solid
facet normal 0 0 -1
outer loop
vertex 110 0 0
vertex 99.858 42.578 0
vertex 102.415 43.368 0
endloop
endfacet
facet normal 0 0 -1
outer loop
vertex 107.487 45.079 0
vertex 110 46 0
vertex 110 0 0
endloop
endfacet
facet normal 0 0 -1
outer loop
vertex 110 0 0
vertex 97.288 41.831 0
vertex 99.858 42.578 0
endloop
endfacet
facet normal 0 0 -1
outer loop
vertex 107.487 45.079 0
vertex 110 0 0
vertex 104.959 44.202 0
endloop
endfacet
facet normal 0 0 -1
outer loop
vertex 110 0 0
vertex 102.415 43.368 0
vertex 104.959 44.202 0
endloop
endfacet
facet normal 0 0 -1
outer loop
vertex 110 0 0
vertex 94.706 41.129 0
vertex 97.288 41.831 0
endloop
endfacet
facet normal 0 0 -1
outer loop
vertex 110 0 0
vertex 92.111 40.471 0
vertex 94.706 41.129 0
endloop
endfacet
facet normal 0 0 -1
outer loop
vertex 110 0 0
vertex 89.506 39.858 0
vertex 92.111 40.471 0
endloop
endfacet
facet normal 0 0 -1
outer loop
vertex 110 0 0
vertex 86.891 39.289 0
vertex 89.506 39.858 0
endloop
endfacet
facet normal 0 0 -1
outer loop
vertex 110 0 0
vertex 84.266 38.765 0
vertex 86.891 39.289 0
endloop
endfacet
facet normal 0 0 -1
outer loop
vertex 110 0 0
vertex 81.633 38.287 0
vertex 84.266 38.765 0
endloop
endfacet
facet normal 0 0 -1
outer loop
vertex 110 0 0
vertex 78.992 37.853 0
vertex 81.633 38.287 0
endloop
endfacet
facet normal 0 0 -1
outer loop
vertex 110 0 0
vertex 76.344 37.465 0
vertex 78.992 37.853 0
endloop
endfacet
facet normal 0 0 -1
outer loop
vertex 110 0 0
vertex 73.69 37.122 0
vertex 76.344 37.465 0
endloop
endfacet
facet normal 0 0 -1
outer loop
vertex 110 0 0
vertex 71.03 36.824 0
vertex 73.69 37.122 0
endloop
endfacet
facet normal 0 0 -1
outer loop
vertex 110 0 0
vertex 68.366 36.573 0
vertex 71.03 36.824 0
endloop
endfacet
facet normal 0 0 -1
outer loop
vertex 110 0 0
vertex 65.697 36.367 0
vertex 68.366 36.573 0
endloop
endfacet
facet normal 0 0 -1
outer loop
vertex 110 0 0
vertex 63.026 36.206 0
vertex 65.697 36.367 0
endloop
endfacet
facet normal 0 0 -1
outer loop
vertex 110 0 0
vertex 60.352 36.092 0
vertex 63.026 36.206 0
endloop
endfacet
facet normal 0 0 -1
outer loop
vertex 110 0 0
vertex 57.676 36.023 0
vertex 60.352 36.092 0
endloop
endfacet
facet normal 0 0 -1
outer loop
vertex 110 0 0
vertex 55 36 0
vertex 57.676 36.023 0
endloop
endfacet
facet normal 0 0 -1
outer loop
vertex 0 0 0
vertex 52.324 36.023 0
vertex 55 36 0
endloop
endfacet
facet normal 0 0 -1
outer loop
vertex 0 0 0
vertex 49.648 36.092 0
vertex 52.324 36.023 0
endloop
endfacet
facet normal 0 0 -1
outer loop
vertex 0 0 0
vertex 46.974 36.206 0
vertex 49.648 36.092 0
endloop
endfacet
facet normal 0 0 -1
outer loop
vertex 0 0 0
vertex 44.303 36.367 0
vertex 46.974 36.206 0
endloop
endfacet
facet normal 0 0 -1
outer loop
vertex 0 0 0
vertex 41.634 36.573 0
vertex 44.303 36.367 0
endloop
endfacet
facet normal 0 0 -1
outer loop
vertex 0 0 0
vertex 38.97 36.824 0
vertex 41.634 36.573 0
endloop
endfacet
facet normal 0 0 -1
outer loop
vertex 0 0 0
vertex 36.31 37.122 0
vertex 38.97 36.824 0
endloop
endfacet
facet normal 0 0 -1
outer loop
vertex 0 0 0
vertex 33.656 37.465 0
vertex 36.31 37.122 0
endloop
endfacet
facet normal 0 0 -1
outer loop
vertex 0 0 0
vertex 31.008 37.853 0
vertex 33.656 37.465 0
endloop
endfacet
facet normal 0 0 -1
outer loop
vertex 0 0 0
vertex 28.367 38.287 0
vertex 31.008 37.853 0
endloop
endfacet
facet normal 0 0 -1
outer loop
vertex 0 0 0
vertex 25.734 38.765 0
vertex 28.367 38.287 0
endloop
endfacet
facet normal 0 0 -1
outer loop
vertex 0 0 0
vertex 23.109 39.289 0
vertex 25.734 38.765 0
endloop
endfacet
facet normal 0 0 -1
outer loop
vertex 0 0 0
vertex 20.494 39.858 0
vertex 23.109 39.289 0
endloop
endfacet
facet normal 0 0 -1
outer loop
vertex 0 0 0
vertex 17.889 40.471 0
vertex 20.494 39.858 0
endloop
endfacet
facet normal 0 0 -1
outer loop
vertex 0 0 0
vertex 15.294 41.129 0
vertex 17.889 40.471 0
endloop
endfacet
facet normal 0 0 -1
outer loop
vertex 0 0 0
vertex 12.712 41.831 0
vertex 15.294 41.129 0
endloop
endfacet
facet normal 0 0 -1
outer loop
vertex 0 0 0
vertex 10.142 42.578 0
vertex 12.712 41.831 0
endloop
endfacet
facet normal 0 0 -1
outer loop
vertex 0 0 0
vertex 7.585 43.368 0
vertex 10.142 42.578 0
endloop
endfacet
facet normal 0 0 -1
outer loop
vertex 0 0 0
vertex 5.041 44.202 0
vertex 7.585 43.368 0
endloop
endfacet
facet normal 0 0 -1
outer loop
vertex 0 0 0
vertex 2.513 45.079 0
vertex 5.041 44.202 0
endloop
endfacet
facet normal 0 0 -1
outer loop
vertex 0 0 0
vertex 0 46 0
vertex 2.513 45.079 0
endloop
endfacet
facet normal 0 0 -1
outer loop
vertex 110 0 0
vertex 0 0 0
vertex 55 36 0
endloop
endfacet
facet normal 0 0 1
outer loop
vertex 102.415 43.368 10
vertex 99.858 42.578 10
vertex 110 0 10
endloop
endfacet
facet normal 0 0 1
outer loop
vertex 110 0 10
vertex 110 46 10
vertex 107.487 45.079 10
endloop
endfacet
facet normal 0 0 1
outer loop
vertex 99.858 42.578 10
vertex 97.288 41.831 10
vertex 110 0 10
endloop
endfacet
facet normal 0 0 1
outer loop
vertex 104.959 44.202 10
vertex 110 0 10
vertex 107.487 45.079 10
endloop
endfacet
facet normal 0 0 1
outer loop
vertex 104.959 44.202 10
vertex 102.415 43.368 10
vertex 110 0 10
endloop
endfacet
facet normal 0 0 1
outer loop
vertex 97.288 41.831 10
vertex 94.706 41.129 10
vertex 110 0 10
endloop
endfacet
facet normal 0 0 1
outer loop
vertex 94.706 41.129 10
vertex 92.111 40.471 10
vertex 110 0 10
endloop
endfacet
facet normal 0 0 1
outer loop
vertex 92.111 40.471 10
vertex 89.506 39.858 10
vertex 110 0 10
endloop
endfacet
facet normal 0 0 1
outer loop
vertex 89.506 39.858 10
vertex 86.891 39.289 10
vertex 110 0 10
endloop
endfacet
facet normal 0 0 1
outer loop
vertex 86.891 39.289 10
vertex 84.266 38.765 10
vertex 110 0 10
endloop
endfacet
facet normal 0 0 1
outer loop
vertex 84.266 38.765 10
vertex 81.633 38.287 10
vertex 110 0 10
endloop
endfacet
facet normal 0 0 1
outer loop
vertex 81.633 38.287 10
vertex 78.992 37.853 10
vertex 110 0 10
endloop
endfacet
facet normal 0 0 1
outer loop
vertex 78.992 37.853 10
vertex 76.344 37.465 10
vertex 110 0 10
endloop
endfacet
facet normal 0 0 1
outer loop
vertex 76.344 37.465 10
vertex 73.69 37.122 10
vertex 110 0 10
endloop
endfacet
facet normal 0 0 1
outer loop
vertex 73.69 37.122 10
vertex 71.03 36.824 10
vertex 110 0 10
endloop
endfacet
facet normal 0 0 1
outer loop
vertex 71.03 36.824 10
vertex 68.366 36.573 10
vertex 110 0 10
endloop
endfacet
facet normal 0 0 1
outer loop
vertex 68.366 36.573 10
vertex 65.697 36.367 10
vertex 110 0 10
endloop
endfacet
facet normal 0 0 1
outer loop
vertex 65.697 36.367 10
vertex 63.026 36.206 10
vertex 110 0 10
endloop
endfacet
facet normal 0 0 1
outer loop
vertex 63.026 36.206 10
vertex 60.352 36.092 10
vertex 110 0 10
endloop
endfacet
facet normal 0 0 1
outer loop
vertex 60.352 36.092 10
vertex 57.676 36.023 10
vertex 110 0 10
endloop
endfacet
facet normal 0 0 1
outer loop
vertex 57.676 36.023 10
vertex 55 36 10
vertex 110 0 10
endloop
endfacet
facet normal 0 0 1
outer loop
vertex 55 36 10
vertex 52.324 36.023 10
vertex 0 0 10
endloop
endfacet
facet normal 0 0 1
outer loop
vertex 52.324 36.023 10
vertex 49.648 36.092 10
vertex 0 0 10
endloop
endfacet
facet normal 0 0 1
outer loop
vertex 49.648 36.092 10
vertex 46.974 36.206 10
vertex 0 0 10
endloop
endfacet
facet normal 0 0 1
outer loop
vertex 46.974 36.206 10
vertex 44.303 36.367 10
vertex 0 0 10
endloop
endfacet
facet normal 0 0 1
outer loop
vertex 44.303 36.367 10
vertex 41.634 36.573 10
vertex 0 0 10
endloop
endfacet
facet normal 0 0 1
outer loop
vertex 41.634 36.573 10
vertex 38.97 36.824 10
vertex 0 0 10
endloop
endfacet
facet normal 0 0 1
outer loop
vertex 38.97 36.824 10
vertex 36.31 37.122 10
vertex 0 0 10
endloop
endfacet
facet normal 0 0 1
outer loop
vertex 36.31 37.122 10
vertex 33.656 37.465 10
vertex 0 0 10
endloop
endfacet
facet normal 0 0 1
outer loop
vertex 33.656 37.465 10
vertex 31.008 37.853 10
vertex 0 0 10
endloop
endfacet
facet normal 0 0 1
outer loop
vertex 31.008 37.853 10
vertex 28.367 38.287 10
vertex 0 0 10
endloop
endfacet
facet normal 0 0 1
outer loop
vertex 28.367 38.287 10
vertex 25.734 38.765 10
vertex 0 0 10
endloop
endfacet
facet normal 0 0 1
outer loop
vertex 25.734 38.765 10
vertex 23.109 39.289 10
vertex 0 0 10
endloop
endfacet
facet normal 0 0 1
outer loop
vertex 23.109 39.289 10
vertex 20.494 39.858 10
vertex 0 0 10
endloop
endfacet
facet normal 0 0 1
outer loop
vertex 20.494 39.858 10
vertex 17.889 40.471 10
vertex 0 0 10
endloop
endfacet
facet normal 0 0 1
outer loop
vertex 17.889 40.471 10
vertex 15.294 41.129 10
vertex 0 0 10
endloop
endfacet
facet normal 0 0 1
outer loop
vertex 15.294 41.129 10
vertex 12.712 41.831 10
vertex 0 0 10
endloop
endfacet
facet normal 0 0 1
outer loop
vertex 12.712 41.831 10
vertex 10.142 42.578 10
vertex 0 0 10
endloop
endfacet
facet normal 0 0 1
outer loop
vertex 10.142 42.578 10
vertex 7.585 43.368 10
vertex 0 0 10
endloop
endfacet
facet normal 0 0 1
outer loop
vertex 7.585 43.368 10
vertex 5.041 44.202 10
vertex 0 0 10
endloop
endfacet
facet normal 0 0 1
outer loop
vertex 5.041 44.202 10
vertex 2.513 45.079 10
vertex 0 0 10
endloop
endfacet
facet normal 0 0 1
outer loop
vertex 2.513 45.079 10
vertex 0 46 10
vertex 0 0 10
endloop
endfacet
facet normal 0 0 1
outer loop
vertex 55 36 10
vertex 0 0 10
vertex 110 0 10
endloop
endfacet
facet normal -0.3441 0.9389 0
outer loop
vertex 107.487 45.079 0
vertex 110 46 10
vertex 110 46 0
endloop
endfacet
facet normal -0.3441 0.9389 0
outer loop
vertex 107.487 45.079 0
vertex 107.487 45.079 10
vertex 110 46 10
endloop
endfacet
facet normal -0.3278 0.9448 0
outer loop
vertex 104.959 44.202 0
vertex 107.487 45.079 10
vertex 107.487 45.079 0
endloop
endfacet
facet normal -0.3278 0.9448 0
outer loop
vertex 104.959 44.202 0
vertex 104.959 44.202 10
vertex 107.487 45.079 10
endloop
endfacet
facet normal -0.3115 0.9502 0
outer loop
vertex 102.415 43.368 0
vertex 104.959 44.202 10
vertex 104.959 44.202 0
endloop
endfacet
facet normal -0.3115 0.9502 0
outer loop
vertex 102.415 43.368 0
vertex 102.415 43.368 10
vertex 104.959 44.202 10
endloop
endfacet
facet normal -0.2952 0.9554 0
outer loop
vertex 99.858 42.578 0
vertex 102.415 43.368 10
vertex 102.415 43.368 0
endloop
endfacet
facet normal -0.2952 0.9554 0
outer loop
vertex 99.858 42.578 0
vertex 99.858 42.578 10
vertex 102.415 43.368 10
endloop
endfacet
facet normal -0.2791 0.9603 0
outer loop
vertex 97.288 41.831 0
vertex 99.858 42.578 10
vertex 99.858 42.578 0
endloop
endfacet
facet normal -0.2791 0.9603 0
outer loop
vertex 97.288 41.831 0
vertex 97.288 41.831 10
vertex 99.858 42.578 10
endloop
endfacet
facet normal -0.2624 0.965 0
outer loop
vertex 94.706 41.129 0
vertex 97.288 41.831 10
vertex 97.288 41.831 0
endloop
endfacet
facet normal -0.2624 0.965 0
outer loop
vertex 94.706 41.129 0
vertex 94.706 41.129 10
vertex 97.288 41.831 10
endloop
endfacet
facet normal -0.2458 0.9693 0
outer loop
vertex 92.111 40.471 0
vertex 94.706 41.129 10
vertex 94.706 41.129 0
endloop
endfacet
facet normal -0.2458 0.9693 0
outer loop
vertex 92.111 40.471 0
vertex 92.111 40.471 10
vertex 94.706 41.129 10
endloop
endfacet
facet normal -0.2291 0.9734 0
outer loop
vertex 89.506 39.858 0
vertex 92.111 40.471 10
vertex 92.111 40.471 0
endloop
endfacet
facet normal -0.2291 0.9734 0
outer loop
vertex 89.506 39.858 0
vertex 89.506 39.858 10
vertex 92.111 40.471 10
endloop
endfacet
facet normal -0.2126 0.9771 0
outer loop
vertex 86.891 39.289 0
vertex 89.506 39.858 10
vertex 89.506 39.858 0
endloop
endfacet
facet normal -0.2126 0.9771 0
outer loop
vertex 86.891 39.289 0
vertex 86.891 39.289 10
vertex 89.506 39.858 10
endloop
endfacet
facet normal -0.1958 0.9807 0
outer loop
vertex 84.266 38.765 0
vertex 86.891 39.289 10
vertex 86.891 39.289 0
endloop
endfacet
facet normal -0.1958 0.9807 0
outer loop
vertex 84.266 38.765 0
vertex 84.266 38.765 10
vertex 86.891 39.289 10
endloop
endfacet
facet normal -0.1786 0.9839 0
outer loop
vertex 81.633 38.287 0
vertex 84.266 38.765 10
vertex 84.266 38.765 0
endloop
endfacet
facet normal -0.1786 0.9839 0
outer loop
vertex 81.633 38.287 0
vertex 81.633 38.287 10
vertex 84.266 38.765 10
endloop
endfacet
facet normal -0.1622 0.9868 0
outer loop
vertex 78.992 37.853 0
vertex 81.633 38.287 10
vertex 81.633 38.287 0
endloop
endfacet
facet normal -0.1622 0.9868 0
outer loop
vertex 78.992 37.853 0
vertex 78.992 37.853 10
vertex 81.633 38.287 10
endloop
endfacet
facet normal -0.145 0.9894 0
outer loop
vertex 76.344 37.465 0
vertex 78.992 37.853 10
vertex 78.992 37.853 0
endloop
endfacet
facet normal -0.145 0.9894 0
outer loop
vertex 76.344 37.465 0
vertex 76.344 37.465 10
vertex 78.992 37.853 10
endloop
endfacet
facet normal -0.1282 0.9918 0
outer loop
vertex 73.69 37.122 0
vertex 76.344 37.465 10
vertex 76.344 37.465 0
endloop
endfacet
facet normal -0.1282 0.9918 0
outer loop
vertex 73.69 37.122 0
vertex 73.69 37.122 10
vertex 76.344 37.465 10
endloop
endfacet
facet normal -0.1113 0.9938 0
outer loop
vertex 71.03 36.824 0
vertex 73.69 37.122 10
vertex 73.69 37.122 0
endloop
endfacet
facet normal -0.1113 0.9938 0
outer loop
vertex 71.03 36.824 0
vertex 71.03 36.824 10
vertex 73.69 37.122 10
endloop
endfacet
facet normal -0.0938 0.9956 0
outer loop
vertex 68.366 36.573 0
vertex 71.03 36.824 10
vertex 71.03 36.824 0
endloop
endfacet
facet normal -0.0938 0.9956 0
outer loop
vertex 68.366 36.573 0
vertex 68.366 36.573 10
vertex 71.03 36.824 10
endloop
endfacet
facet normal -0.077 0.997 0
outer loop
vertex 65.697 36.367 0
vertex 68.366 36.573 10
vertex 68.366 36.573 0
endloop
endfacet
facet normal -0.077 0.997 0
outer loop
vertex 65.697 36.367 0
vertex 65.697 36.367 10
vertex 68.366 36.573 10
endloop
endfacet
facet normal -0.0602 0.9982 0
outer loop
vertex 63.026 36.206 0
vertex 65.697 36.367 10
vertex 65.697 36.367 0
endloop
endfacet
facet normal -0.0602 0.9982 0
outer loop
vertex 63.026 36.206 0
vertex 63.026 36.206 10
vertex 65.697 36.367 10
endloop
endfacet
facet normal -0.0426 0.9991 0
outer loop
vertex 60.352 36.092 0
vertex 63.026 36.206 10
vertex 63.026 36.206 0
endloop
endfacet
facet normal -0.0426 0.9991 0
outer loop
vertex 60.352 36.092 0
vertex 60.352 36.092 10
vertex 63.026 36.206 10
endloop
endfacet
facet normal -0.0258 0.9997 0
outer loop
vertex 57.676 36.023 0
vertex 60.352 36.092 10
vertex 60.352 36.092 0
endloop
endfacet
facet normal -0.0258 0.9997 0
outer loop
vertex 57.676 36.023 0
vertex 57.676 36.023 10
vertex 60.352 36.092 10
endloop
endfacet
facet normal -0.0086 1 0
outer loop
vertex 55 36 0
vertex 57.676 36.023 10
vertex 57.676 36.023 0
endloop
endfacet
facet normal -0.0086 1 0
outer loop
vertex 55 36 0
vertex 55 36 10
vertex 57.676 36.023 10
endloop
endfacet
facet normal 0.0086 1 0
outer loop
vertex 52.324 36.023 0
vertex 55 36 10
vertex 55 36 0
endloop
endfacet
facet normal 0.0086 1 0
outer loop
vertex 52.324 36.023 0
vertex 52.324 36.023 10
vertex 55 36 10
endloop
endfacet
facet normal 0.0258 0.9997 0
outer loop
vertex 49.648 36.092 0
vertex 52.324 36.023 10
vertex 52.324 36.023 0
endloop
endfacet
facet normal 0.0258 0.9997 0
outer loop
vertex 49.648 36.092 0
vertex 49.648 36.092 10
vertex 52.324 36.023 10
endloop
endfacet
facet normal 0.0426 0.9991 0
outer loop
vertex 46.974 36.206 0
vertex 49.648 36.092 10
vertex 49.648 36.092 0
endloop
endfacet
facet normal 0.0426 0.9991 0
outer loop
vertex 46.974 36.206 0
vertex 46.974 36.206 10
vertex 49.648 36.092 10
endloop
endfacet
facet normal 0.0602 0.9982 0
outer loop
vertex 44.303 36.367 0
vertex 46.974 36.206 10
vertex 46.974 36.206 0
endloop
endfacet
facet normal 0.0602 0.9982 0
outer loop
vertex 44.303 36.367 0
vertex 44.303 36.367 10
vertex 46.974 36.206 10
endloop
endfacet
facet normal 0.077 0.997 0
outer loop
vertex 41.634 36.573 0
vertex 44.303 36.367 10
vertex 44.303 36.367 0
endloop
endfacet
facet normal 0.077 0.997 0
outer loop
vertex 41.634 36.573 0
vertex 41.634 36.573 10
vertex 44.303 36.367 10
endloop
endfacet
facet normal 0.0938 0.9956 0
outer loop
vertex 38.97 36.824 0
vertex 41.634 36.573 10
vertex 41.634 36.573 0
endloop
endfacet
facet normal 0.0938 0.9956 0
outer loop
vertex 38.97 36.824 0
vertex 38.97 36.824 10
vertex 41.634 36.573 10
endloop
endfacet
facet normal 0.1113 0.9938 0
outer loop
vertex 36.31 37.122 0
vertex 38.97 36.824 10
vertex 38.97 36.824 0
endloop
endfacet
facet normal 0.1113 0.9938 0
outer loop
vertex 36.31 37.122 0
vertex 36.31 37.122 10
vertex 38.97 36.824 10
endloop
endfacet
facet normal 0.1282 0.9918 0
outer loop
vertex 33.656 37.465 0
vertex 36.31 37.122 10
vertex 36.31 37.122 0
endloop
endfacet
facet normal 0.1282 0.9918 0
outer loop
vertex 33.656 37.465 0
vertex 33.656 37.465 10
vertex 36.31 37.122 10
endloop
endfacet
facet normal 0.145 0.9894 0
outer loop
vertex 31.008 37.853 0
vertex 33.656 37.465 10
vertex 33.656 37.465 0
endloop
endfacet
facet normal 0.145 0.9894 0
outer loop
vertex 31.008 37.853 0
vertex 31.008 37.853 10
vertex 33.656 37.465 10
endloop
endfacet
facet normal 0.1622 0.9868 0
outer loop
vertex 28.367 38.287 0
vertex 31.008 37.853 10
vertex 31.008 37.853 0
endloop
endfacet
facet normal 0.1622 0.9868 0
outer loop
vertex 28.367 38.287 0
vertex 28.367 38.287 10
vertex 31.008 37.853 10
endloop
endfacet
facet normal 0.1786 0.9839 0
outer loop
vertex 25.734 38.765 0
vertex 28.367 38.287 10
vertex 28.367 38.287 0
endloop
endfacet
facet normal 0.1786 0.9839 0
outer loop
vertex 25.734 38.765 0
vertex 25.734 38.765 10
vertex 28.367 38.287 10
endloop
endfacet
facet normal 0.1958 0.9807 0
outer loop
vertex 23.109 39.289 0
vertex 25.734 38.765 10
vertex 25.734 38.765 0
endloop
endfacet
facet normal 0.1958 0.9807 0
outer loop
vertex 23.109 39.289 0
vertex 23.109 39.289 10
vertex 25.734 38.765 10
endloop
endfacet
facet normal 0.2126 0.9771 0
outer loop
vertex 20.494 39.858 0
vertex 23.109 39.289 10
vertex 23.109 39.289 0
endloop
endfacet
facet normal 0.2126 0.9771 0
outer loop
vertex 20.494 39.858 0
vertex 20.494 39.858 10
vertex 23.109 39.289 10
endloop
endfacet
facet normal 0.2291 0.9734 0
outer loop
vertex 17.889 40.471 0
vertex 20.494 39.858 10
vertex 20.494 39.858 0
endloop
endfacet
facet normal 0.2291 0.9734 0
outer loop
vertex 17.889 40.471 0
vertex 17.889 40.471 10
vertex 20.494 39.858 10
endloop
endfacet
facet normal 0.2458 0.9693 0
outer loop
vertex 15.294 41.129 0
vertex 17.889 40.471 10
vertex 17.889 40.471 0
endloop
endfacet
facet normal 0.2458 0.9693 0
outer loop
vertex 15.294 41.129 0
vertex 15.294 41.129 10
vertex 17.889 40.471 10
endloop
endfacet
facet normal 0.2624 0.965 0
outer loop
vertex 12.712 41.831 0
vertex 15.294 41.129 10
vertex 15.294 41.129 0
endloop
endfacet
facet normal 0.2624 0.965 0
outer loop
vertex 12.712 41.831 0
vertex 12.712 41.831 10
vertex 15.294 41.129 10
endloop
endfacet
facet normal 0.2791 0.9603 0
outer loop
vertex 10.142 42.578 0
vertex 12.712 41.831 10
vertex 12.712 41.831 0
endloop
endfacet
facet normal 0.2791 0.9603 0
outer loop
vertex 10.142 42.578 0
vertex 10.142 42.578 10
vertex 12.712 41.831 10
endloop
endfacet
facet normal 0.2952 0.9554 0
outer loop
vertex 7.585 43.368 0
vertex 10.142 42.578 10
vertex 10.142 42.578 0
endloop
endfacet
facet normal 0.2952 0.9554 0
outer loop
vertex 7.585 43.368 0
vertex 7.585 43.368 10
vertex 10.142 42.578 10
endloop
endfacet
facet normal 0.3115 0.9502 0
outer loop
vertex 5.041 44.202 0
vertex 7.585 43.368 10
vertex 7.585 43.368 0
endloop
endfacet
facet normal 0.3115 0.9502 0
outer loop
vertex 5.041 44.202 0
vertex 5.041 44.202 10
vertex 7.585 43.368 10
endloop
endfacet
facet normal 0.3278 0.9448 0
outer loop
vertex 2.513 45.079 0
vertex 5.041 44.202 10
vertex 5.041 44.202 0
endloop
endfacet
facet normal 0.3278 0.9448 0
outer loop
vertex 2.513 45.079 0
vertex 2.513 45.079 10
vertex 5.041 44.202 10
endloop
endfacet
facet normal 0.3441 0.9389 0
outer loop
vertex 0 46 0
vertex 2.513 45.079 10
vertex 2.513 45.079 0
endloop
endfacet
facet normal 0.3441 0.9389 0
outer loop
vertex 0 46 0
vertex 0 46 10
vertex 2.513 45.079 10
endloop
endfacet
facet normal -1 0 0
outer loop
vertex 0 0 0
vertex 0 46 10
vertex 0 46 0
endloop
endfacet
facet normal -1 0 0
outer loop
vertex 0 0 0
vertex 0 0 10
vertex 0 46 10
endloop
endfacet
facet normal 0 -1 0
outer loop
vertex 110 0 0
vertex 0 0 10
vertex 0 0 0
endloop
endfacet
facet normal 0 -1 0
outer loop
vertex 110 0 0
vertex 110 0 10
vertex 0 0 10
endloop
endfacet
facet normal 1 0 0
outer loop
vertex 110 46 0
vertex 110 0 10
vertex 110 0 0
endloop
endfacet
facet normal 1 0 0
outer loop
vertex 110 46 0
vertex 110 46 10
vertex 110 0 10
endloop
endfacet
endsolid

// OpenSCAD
$fn = 32;

// ----------------------------------------------------------------------
// Arc profile plate: notch, 45 points
// ----------------------------------------------------------------------

// --- parameters (mm) ---
bar_l = 110;              // bar length, X
bar_w = 46;               // bar width, Y
notch_depth = 10;         // depth of the arc notch at mid-span
arc_r = 156.25;           // radius of the notch arc
arc_angle = 41.22;        // notch arc angle, degrees
arc_step = 1;             // sampling step of the notch arc, degrees
plate_t = 10;             // plate thickness, Z
fit_tol = 0.05;           // declared fit tolerance (prompt contract)
free_tol = 0.3;           // declared free tolerance (prompt contract)

profile = [[0, 0], [110, 0], [110, 46], [107.487, 45.079], [104.959, 44.202], [102.415, 43.368], [99.858, 42.578], [97.288, 41.831], [94.706, 41.129], [92.111, 40.471], [89.506, 39.858], [86.891, 39.289], [84.266, 38.765], [81.633, 38.287], [78.992, 37.853], [76.344, 37.465], [73.69, 37.122], [71.03, 36.824], [68.366, 36.573], [65.697, 36.367], [63.026, 36.206], [60.352, 36.092], [57.676, 36.023], [55, 36], [52.324, 36.023], [49.648, 36.092], [46.974, 36.206], [44.303, 36.367], [41.634, 36.573], [38.97, 36.824], [36.31, 37.122], [33.656, 37.465], [31.008, 37.853], [28.367, 38.287], [25.734, 38.765], [23.109, 39.289], [20.494, 39.858], [17.889, 40.471], [15.294, 41.129], [12.712, 41.831], [10.142, 42.578], [7.585, 43.368], [5.041, 44.202], [2.513, 45.079], [0, 46]];  // primary outline, 45 points, counter clockwise

// --- the one profile operation ---
linear_extrude(height = plate_t) polygon(points = profile);
